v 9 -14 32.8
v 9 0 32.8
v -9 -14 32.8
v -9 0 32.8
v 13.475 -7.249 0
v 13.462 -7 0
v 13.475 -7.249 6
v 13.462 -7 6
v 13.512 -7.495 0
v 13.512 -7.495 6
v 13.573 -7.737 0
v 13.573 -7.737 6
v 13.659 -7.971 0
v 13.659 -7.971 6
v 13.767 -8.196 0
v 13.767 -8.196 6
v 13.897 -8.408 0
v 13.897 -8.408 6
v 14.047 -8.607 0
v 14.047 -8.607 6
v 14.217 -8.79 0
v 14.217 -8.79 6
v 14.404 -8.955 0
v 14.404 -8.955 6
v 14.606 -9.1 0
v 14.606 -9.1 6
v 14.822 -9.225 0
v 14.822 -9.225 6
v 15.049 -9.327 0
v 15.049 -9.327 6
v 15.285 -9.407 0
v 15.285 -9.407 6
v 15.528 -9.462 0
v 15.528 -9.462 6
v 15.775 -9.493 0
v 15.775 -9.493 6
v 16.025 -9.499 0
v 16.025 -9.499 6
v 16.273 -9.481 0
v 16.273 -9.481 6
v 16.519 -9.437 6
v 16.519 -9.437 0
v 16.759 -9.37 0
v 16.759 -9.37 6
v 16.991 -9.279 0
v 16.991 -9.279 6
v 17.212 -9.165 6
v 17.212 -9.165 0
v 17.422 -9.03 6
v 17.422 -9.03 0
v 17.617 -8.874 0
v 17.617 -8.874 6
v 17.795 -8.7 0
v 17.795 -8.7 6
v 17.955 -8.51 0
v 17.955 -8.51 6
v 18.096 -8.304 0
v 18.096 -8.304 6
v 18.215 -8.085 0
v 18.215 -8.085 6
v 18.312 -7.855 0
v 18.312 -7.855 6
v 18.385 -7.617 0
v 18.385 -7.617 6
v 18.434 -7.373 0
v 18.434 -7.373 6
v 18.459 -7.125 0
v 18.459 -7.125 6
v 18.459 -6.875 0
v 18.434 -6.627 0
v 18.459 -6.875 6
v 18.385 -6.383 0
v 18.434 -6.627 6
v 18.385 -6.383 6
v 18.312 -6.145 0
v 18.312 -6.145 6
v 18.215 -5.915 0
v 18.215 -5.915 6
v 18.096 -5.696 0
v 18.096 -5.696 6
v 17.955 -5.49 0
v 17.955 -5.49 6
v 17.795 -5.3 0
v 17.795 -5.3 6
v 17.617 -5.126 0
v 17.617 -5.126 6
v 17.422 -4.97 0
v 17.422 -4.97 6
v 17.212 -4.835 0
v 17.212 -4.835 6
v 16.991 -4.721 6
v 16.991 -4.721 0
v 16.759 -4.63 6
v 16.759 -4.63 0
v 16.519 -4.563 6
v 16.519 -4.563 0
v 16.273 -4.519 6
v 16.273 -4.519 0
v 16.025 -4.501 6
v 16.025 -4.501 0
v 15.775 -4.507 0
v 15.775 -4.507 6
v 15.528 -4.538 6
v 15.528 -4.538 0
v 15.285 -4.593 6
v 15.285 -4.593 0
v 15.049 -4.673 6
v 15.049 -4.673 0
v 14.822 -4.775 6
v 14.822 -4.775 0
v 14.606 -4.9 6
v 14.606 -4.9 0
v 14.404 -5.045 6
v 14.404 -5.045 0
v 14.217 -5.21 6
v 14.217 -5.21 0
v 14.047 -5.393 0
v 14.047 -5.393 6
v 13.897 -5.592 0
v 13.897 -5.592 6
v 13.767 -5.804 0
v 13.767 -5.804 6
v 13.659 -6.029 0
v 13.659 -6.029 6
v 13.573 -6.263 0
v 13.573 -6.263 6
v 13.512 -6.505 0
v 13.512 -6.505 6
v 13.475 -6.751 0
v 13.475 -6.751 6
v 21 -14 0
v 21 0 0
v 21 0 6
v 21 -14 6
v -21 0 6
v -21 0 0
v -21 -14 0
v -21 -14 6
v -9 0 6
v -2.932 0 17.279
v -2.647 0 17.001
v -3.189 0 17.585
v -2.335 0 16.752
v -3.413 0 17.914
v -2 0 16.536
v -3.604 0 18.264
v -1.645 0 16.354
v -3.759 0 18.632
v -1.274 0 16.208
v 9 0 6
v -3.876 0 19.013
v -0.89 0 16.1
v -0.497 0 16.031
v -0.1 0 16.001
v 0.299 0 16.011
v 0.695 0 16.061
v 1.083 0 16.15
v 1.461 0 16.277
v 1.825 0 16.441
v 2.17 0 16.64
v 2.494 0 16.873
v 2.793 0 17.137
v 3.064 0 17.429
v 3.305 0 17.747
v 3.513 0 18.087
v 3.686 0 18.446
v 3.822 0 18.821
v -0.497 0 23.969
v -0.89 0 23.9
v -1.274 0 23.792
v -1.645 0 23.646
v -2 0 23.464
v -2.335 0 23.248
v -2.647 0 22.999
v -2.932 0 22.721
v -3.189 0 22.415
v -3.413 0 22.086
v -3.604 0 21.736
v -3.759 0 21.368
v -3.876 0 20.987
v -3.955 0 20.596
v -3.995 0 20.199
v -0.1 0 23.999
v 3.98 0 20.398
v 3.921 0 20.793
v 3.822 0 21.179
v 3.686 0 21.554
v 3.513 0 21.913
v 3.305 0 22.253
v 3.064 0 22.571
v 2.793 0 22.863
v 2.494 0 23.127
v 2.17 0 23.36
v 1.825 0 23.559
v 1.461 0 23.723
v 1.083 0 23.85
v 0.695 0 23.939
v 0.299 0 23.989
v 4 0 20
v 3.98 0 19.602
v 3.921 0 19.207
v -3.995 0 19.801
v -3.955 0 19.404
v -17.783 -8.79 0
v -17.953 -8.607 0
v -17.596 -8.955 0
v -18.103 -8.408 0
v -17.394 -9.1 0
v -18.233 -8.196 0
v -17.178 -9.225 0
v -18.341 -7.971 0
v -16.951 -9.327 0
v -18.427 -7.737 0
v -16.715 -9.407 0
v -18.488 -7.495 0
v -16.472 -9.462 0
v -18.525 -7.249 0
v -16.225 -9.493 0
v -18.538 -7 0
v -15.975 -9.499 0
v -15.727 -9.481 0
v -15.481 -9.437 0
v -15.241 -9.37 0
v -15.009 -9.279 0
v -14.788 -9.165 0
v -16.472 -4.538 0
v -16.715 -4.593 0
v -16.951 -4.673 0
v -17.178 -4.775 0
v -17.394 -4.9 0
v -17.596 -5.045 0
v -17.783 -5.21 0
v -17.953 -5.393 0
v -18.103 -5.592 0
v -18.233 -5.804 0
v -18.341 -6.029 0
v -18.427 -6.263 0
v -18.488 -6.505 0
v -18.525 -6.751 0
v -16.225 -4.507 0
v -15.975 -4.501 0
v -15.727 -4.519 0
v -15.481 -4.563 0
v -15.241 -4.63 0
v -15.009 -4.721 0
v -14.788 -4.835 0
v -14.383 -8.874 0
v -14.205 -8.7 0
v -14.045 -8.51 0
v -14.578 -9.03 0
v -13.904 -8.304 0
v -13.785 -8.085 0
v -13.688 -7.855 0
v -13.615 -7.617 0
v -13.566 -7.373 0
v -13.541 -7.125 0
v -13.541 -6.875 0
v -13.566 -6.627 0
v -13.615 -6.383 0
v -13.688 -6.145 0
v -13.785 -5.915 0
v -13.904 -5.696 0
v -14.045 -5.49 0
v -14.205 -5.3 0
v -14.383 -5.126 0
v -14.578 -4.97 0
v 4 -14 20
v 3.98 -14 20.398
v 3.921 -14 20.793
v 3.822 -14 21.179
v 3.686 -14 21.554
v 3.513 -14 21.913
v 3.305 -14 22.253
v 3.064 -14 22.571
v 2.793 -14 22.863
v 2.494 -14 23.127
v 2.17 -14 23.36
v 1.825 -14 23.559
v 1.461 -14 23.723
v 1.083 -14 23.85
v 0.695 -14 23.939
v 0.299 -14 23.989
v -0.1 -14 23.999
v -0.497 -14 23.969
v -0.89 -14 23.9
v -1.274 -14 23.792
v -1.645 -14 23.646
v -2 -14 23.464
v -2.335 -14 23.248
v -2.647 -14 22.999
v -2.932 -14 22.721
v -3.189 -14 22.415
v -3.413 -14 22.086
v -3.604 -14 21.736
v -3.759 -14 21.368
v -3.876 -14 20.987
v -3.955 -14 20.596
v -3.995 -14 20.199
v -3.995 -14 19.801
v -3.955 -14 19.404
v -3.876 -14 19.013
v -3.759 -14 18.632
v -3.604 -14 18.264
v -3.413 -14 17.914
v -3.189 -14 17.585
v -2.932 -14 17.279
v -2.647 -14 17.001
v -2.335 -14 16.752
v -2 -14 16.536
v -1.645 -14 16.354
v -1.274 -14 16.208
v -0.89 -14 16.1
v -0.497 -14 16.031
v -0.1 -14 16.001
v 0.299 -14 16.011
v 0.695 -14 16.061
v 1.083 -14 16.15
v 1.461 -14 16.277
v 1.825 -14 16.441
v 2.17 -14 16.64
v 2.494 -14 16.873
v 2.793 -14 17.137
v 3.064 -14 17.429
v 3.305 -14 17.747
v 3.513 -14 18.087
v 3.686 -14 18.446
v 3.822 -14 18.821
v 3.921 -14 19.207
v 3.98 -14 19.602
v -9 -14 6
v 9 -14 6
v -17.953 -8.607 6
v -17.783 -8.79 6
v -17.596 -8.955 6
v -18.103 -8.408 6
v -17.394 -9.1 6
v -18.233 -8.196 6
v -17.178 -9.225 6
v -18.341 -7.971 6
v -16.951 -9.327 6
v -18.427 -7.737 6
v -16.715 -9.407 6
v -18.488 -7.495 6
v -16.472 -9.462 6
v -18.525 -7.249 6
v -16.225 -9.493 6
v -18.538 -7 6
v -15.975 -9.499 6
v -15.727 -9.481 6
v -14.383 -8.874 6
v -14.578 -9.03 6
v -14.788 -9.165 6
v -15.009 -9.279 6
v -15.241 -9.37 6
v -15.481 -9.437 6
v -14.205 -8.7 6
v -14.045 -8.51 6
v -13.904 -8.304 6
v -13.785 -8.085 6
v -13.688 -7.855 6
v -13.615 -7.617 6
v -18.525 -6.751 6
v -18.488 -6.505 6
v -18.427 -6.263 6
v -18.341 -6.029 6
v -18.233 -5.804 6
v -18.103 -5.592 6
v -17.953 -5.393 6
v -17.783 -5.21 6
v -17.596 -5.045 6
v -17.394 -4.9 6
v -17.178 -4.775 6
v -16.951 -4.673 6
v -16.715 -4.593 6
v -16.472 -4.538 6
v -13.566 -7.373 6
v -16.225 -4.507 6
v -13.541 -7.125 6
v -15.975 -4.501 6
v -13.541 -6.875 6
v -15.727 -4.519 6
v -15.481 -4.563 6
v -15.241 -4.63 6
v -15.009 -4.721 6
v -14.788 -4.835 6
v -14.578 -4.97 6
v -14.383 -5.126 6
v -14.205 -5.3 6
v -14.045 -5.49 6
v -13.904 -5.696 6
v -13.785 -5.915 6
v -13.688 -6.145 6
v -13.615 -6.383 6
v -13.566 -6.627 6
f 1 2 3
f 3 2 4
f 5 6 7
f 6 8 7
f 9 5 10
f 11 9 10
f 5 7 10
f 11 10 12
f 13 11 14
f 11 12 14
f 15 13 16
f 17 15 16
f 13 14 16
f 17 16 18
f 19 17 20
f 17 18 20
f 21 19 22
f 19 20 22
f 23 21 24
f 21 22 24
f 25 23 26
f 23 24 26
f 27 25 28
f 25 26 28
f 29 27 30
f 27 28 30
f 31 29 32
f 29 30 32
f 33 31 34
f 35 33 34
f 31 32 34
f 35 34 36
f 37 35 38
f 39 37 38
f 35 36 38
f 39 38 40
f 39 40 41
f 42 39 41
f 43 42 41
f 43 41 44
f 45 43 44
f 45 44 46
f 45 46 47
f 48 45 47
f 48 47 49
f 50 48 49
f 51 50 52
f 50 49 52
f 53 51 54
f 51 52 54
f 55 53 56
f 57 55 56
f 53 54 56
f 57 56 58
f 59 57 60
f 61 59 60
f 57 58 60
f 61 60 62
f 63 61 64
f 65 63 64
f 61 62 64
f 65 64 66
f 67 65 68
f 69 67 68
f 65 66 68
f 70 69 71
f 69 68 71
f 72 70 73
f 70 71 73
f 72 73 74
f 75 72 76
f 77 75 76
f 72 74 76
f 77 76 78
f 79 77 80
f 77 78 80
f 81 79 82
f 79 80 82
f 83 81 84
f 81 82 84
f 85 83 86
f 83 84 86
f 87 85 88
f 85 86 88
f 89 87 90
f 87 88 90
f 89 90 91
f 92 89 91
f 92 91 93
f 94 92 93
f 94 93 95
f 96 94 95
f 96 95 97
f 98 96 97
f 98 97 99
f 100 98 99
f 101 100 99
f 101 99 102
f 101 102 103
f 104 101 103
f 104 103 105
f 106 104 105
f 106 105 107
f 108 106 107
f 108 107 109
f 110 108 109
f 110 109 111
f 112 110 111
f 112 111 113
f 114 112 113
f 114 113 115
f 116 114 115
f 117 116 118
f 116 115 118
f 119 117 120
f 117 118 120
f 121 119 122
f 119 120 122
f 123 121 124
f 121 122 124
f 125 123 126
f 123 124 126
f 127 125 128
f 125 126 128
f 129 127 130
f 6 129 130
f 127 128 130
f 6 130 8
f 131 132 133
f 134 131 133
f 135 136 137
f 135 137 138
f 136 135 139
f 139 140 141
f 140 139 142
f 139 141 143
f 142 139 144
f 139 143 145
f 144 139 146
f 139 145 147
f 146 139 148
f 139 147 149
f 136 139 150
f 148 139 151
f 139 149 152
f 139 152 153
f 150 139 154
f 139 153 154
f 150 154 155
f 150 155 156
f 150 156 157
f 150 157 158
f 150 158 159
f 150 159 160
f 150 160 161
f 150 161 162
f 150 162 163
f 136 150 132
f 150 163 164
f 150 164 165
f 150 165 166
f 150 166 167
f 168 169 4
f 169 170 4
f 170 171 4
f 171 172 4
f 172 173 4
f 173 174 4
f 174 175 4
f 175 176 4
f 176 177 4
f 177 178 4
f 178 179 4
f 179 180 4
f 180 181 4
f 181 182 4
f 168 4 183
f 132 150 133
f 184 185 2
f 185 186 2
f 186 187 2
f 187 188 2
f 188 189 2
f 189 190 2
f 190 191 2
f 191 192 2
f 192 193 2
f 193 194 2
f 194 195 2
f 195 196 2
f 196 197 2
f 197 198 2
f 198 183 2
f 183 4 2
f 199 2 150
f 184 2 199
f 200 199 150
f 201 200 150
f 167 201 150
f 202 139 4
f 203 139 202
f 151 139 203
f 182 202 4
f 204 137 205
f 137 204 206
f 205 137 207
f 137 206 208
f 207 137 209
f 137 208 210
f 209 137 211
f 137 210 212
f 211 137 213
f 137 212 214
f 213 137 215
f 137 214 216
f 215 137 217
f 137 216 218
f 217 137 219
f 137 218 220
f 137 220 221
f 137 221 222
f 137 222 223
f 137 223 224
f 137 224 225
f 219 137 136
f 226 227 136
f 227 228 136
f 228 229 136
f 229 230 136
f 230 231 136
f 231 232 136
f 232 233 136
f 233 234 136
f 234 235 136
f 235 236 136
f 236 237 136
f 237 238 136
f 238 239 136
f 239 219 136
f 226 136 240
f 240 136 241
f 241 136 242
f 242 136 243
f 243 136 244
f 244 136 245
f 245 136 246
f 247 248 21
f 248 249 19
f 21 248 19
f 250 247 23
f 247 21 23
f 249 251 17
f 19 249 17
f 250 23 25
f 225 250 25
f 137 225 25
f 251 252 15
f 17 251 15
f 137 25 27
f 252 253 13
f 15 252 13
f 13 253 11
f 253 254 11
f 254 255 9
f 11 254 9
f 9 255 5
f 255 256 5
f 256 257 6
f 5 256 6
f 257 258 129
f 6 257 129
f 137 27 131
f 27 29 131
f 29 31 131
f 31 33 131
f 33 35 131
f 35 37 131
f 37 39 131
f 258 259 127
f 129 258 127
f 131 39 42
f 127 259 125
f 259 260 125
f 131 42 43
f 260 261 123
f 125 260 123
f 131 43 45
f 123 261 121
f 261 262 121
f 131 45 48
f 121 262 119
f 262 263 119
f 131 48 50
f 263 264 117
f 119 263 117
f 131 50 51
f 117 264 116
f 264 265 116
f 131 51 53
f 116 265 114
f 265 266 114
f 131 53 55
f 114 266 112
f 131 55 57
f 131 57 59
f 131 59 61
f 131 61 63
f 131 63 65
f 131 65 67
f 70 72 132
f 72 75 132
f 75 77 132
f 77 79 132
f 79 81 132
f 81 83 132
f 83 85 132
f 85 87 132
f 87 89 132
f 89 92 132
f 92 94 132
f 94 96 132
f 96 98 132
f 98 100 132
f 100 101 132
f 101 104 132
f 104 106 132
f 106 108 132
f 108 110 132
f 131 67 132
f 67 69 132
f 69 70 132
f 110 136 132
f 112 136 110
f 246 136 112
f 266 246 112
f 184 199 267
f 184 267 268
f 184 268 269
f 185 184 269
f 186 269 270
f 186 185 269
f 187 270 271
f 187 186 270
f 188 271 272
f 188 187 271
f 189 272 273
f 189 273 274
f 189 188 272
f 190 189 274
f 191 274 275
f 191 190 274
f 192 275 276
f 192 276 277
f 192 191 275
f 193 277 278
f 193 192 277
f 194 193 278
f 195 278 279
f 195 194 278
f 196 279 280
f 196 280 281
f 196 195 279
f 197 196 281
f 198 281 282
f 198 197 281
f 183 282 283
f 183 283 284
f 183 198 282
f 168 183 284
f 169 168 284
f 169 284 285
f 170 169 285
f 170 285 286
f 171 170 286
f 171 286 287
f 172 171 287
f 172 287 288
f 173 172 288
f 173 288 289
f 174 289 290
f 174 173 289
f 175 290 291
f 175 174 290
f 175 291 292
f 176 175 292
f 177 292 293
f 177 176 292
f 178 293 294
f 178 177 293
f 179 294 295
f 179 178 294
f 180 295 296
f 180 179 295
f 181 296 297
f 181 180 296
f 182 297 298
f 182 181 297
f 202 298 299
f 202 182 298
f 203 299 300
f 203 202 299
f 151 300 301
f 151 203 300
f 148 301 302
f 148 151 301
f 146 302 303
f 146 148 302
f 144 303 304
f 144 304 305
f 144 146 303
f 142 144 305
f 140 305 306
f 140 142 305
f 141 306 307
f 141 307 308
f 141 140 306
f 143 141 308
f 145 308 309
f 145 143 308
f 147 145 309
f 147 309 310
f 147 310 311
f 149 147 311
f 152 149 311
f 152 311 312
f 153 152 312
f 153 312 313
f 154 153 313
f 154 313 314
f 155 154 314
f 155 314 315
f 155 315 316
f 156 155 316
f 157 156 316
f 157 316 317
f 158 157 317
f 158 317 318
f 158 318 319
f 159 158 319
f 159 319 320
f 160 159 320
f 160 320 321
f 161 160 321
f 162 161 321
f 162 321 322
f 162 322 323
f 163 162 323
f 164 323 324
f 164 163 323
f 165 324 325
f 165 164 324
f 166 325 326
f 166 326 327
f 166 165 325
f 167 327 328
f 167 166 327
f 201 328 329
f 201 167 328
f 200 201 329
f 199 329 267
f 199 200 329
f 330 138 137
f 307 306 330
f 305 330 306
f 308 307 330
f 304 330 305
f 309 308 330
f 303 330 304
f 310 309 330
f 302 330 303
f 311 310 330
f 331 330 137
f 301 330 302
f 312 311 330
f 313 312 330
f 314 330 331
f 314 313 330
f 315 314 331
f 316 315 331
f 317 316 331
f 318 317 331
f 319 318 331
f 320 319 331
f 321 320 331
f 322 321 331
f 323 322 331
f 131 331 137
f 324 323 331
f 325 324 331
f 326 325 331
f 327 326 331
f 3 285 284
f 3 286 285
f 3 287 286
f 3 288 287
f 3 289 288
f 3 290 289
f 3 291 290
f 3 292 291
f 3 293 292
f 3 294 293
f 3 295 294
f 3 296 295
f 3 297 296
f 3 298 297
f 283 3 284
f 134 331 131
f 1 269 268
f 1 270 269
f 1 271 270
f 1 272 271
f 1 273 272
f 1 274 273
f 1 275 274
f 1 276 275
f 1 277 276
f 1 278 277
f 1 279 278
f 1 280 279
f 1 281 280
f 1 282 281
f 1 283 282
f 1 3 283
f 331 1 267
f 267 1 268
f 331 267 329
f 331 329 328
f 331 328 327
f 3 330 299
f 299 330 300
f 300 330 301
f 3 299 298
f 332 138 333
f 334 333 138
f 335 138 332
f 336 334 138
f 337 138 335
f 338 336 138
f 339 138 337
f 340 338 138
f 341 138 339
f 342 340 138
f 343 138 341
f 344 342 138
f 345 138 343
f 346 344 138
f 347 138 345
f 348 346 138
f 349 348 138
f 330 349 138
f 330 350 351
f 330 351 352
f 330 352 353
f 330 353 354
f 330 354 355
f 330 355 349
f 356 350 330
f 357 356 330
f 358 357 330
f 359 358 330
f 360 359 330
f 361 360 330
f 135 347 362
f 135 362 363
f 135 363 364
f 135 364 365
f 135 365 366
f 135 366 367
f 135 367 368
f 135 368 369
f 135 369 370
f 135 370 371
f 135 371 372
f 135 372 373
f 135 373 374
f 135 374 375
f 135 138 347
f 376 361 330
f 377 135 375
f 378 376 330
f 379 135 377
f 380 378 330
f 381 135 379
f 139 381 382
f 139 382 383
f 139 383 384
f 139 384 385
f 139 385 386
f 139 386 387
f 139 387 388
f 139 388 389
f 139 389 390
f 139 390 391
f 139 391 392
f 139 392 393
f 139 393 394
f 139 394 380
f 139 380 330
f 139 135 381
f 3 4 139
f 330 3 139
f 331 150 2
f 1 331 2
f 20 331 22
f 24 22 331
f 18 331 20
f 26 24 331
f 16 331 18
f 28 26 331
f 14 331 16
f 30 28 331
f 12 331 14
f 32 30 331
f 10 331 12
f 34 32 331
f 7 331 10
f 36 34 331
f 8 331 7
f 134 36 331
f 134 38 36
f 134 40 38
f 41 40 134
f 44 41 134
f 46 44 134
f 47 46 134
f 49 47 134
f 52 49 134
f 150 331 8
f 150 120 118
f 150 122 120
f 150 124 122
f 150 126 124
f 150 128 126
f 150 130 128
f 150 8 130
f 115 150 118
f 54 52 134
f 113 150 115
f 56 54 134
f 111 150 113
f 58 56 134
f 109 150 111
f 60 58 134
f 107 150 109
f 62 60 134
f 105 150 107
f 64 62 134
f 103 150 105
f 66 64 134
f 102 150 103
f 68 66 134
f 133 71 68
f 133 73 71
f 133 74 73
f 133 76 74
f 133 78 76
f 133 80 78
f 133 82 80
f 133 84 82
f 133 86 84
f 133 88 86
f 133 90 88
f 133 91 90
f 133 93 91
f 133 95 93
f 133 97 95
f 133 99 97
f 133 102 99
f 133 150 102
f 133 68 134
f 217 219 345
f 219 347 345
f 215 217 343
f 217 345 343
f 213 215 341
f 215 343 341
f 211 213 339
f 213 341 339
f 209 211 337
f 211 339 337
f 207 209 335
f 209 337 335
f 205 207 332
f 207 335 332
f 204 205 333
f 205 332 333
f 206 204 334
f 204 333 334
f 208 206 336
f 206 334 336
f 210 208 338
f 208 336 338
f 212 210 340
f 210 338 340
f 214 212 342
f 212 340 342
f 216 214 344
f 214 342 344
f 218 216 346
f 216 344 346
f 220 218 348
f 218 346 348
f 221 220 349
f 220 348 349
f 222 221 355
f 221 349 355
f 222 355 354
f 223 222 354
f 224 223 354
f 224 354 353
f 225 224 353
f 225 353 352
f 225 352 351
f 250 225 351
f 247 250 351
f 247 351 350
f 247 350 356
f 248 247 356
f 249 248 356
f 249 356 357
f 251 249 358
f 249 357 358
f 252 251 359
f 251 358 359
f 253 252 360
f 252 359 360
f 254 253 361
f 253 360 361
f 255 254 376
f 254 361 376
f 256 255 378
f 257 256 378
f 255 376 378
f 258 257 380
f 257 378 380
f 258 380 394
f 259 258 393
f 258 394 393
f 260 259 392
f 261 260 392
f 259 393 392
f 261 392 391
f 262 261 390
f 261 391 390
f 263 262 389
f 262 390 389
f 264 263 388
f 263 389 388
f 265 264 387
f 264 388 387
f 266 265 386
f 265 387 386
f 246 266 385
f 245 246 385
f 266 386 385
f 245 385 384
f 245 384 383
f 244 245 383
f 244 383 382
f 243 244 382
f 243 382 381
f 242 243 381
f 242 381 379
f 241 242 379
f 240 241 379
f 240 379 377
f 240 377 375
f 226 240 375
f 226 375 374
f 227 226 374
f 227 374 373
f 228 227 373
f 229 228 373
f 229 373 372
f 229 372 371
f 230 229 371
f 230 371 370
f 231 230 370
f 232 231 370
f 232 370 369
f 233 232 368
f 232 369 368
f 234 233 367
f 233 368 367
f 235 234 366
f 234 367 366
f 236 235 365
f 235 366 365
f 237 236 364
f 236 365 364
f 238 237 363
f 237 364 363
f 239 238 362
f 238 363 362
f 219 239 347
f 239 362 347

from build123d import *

# Parameters (mm, degrees)
F0_W     = 12
F0_H     = 6
F0_R     = 4
F1_DEPTH = 14
F3_D     = 5
F3_DEPTH = 6
F3_TIP   = 1.5021515476


with BuildPart() as f1:
    # F0 (on Front) → F1 (new body)
    with BuildSketch(Plane.XZ):
        with Locations((-15, 3)):
            Rectangle(F0_W, F0_H)
        Polygon((-9, 0), (0, 0), (9, 0), (9, 6), (9, 32.8), (0, 32.8), (-9, 32.8), (-9, 6), align=None)
        with Locations((0, 20)):
            Circle(F0_R, mode=Mode.SUBTRACT)
        with Locations((15, 3)):
            Rectangle(F0_W, F0_H)
    extrude(amount=F1_DEPTH)

    # F3
    with Locations(Plane(origin=(0, 0, 0), x_dir=(1, 0, 0), z_dir=(0, 0, -1))):
        with Locations((-16.037677303, 7), (15.962322697, 7)):
            Hole(F3_D / 2, depth=F3_DEPTH)
            with Locations((0, 0, -(F3_DEPTH + F3_TIP / 2))):  # 118° drill point
                Cone(0, F3_D / 2, F3_TIP, mode=Mode.SUBTRACT)


solid = f1.part
